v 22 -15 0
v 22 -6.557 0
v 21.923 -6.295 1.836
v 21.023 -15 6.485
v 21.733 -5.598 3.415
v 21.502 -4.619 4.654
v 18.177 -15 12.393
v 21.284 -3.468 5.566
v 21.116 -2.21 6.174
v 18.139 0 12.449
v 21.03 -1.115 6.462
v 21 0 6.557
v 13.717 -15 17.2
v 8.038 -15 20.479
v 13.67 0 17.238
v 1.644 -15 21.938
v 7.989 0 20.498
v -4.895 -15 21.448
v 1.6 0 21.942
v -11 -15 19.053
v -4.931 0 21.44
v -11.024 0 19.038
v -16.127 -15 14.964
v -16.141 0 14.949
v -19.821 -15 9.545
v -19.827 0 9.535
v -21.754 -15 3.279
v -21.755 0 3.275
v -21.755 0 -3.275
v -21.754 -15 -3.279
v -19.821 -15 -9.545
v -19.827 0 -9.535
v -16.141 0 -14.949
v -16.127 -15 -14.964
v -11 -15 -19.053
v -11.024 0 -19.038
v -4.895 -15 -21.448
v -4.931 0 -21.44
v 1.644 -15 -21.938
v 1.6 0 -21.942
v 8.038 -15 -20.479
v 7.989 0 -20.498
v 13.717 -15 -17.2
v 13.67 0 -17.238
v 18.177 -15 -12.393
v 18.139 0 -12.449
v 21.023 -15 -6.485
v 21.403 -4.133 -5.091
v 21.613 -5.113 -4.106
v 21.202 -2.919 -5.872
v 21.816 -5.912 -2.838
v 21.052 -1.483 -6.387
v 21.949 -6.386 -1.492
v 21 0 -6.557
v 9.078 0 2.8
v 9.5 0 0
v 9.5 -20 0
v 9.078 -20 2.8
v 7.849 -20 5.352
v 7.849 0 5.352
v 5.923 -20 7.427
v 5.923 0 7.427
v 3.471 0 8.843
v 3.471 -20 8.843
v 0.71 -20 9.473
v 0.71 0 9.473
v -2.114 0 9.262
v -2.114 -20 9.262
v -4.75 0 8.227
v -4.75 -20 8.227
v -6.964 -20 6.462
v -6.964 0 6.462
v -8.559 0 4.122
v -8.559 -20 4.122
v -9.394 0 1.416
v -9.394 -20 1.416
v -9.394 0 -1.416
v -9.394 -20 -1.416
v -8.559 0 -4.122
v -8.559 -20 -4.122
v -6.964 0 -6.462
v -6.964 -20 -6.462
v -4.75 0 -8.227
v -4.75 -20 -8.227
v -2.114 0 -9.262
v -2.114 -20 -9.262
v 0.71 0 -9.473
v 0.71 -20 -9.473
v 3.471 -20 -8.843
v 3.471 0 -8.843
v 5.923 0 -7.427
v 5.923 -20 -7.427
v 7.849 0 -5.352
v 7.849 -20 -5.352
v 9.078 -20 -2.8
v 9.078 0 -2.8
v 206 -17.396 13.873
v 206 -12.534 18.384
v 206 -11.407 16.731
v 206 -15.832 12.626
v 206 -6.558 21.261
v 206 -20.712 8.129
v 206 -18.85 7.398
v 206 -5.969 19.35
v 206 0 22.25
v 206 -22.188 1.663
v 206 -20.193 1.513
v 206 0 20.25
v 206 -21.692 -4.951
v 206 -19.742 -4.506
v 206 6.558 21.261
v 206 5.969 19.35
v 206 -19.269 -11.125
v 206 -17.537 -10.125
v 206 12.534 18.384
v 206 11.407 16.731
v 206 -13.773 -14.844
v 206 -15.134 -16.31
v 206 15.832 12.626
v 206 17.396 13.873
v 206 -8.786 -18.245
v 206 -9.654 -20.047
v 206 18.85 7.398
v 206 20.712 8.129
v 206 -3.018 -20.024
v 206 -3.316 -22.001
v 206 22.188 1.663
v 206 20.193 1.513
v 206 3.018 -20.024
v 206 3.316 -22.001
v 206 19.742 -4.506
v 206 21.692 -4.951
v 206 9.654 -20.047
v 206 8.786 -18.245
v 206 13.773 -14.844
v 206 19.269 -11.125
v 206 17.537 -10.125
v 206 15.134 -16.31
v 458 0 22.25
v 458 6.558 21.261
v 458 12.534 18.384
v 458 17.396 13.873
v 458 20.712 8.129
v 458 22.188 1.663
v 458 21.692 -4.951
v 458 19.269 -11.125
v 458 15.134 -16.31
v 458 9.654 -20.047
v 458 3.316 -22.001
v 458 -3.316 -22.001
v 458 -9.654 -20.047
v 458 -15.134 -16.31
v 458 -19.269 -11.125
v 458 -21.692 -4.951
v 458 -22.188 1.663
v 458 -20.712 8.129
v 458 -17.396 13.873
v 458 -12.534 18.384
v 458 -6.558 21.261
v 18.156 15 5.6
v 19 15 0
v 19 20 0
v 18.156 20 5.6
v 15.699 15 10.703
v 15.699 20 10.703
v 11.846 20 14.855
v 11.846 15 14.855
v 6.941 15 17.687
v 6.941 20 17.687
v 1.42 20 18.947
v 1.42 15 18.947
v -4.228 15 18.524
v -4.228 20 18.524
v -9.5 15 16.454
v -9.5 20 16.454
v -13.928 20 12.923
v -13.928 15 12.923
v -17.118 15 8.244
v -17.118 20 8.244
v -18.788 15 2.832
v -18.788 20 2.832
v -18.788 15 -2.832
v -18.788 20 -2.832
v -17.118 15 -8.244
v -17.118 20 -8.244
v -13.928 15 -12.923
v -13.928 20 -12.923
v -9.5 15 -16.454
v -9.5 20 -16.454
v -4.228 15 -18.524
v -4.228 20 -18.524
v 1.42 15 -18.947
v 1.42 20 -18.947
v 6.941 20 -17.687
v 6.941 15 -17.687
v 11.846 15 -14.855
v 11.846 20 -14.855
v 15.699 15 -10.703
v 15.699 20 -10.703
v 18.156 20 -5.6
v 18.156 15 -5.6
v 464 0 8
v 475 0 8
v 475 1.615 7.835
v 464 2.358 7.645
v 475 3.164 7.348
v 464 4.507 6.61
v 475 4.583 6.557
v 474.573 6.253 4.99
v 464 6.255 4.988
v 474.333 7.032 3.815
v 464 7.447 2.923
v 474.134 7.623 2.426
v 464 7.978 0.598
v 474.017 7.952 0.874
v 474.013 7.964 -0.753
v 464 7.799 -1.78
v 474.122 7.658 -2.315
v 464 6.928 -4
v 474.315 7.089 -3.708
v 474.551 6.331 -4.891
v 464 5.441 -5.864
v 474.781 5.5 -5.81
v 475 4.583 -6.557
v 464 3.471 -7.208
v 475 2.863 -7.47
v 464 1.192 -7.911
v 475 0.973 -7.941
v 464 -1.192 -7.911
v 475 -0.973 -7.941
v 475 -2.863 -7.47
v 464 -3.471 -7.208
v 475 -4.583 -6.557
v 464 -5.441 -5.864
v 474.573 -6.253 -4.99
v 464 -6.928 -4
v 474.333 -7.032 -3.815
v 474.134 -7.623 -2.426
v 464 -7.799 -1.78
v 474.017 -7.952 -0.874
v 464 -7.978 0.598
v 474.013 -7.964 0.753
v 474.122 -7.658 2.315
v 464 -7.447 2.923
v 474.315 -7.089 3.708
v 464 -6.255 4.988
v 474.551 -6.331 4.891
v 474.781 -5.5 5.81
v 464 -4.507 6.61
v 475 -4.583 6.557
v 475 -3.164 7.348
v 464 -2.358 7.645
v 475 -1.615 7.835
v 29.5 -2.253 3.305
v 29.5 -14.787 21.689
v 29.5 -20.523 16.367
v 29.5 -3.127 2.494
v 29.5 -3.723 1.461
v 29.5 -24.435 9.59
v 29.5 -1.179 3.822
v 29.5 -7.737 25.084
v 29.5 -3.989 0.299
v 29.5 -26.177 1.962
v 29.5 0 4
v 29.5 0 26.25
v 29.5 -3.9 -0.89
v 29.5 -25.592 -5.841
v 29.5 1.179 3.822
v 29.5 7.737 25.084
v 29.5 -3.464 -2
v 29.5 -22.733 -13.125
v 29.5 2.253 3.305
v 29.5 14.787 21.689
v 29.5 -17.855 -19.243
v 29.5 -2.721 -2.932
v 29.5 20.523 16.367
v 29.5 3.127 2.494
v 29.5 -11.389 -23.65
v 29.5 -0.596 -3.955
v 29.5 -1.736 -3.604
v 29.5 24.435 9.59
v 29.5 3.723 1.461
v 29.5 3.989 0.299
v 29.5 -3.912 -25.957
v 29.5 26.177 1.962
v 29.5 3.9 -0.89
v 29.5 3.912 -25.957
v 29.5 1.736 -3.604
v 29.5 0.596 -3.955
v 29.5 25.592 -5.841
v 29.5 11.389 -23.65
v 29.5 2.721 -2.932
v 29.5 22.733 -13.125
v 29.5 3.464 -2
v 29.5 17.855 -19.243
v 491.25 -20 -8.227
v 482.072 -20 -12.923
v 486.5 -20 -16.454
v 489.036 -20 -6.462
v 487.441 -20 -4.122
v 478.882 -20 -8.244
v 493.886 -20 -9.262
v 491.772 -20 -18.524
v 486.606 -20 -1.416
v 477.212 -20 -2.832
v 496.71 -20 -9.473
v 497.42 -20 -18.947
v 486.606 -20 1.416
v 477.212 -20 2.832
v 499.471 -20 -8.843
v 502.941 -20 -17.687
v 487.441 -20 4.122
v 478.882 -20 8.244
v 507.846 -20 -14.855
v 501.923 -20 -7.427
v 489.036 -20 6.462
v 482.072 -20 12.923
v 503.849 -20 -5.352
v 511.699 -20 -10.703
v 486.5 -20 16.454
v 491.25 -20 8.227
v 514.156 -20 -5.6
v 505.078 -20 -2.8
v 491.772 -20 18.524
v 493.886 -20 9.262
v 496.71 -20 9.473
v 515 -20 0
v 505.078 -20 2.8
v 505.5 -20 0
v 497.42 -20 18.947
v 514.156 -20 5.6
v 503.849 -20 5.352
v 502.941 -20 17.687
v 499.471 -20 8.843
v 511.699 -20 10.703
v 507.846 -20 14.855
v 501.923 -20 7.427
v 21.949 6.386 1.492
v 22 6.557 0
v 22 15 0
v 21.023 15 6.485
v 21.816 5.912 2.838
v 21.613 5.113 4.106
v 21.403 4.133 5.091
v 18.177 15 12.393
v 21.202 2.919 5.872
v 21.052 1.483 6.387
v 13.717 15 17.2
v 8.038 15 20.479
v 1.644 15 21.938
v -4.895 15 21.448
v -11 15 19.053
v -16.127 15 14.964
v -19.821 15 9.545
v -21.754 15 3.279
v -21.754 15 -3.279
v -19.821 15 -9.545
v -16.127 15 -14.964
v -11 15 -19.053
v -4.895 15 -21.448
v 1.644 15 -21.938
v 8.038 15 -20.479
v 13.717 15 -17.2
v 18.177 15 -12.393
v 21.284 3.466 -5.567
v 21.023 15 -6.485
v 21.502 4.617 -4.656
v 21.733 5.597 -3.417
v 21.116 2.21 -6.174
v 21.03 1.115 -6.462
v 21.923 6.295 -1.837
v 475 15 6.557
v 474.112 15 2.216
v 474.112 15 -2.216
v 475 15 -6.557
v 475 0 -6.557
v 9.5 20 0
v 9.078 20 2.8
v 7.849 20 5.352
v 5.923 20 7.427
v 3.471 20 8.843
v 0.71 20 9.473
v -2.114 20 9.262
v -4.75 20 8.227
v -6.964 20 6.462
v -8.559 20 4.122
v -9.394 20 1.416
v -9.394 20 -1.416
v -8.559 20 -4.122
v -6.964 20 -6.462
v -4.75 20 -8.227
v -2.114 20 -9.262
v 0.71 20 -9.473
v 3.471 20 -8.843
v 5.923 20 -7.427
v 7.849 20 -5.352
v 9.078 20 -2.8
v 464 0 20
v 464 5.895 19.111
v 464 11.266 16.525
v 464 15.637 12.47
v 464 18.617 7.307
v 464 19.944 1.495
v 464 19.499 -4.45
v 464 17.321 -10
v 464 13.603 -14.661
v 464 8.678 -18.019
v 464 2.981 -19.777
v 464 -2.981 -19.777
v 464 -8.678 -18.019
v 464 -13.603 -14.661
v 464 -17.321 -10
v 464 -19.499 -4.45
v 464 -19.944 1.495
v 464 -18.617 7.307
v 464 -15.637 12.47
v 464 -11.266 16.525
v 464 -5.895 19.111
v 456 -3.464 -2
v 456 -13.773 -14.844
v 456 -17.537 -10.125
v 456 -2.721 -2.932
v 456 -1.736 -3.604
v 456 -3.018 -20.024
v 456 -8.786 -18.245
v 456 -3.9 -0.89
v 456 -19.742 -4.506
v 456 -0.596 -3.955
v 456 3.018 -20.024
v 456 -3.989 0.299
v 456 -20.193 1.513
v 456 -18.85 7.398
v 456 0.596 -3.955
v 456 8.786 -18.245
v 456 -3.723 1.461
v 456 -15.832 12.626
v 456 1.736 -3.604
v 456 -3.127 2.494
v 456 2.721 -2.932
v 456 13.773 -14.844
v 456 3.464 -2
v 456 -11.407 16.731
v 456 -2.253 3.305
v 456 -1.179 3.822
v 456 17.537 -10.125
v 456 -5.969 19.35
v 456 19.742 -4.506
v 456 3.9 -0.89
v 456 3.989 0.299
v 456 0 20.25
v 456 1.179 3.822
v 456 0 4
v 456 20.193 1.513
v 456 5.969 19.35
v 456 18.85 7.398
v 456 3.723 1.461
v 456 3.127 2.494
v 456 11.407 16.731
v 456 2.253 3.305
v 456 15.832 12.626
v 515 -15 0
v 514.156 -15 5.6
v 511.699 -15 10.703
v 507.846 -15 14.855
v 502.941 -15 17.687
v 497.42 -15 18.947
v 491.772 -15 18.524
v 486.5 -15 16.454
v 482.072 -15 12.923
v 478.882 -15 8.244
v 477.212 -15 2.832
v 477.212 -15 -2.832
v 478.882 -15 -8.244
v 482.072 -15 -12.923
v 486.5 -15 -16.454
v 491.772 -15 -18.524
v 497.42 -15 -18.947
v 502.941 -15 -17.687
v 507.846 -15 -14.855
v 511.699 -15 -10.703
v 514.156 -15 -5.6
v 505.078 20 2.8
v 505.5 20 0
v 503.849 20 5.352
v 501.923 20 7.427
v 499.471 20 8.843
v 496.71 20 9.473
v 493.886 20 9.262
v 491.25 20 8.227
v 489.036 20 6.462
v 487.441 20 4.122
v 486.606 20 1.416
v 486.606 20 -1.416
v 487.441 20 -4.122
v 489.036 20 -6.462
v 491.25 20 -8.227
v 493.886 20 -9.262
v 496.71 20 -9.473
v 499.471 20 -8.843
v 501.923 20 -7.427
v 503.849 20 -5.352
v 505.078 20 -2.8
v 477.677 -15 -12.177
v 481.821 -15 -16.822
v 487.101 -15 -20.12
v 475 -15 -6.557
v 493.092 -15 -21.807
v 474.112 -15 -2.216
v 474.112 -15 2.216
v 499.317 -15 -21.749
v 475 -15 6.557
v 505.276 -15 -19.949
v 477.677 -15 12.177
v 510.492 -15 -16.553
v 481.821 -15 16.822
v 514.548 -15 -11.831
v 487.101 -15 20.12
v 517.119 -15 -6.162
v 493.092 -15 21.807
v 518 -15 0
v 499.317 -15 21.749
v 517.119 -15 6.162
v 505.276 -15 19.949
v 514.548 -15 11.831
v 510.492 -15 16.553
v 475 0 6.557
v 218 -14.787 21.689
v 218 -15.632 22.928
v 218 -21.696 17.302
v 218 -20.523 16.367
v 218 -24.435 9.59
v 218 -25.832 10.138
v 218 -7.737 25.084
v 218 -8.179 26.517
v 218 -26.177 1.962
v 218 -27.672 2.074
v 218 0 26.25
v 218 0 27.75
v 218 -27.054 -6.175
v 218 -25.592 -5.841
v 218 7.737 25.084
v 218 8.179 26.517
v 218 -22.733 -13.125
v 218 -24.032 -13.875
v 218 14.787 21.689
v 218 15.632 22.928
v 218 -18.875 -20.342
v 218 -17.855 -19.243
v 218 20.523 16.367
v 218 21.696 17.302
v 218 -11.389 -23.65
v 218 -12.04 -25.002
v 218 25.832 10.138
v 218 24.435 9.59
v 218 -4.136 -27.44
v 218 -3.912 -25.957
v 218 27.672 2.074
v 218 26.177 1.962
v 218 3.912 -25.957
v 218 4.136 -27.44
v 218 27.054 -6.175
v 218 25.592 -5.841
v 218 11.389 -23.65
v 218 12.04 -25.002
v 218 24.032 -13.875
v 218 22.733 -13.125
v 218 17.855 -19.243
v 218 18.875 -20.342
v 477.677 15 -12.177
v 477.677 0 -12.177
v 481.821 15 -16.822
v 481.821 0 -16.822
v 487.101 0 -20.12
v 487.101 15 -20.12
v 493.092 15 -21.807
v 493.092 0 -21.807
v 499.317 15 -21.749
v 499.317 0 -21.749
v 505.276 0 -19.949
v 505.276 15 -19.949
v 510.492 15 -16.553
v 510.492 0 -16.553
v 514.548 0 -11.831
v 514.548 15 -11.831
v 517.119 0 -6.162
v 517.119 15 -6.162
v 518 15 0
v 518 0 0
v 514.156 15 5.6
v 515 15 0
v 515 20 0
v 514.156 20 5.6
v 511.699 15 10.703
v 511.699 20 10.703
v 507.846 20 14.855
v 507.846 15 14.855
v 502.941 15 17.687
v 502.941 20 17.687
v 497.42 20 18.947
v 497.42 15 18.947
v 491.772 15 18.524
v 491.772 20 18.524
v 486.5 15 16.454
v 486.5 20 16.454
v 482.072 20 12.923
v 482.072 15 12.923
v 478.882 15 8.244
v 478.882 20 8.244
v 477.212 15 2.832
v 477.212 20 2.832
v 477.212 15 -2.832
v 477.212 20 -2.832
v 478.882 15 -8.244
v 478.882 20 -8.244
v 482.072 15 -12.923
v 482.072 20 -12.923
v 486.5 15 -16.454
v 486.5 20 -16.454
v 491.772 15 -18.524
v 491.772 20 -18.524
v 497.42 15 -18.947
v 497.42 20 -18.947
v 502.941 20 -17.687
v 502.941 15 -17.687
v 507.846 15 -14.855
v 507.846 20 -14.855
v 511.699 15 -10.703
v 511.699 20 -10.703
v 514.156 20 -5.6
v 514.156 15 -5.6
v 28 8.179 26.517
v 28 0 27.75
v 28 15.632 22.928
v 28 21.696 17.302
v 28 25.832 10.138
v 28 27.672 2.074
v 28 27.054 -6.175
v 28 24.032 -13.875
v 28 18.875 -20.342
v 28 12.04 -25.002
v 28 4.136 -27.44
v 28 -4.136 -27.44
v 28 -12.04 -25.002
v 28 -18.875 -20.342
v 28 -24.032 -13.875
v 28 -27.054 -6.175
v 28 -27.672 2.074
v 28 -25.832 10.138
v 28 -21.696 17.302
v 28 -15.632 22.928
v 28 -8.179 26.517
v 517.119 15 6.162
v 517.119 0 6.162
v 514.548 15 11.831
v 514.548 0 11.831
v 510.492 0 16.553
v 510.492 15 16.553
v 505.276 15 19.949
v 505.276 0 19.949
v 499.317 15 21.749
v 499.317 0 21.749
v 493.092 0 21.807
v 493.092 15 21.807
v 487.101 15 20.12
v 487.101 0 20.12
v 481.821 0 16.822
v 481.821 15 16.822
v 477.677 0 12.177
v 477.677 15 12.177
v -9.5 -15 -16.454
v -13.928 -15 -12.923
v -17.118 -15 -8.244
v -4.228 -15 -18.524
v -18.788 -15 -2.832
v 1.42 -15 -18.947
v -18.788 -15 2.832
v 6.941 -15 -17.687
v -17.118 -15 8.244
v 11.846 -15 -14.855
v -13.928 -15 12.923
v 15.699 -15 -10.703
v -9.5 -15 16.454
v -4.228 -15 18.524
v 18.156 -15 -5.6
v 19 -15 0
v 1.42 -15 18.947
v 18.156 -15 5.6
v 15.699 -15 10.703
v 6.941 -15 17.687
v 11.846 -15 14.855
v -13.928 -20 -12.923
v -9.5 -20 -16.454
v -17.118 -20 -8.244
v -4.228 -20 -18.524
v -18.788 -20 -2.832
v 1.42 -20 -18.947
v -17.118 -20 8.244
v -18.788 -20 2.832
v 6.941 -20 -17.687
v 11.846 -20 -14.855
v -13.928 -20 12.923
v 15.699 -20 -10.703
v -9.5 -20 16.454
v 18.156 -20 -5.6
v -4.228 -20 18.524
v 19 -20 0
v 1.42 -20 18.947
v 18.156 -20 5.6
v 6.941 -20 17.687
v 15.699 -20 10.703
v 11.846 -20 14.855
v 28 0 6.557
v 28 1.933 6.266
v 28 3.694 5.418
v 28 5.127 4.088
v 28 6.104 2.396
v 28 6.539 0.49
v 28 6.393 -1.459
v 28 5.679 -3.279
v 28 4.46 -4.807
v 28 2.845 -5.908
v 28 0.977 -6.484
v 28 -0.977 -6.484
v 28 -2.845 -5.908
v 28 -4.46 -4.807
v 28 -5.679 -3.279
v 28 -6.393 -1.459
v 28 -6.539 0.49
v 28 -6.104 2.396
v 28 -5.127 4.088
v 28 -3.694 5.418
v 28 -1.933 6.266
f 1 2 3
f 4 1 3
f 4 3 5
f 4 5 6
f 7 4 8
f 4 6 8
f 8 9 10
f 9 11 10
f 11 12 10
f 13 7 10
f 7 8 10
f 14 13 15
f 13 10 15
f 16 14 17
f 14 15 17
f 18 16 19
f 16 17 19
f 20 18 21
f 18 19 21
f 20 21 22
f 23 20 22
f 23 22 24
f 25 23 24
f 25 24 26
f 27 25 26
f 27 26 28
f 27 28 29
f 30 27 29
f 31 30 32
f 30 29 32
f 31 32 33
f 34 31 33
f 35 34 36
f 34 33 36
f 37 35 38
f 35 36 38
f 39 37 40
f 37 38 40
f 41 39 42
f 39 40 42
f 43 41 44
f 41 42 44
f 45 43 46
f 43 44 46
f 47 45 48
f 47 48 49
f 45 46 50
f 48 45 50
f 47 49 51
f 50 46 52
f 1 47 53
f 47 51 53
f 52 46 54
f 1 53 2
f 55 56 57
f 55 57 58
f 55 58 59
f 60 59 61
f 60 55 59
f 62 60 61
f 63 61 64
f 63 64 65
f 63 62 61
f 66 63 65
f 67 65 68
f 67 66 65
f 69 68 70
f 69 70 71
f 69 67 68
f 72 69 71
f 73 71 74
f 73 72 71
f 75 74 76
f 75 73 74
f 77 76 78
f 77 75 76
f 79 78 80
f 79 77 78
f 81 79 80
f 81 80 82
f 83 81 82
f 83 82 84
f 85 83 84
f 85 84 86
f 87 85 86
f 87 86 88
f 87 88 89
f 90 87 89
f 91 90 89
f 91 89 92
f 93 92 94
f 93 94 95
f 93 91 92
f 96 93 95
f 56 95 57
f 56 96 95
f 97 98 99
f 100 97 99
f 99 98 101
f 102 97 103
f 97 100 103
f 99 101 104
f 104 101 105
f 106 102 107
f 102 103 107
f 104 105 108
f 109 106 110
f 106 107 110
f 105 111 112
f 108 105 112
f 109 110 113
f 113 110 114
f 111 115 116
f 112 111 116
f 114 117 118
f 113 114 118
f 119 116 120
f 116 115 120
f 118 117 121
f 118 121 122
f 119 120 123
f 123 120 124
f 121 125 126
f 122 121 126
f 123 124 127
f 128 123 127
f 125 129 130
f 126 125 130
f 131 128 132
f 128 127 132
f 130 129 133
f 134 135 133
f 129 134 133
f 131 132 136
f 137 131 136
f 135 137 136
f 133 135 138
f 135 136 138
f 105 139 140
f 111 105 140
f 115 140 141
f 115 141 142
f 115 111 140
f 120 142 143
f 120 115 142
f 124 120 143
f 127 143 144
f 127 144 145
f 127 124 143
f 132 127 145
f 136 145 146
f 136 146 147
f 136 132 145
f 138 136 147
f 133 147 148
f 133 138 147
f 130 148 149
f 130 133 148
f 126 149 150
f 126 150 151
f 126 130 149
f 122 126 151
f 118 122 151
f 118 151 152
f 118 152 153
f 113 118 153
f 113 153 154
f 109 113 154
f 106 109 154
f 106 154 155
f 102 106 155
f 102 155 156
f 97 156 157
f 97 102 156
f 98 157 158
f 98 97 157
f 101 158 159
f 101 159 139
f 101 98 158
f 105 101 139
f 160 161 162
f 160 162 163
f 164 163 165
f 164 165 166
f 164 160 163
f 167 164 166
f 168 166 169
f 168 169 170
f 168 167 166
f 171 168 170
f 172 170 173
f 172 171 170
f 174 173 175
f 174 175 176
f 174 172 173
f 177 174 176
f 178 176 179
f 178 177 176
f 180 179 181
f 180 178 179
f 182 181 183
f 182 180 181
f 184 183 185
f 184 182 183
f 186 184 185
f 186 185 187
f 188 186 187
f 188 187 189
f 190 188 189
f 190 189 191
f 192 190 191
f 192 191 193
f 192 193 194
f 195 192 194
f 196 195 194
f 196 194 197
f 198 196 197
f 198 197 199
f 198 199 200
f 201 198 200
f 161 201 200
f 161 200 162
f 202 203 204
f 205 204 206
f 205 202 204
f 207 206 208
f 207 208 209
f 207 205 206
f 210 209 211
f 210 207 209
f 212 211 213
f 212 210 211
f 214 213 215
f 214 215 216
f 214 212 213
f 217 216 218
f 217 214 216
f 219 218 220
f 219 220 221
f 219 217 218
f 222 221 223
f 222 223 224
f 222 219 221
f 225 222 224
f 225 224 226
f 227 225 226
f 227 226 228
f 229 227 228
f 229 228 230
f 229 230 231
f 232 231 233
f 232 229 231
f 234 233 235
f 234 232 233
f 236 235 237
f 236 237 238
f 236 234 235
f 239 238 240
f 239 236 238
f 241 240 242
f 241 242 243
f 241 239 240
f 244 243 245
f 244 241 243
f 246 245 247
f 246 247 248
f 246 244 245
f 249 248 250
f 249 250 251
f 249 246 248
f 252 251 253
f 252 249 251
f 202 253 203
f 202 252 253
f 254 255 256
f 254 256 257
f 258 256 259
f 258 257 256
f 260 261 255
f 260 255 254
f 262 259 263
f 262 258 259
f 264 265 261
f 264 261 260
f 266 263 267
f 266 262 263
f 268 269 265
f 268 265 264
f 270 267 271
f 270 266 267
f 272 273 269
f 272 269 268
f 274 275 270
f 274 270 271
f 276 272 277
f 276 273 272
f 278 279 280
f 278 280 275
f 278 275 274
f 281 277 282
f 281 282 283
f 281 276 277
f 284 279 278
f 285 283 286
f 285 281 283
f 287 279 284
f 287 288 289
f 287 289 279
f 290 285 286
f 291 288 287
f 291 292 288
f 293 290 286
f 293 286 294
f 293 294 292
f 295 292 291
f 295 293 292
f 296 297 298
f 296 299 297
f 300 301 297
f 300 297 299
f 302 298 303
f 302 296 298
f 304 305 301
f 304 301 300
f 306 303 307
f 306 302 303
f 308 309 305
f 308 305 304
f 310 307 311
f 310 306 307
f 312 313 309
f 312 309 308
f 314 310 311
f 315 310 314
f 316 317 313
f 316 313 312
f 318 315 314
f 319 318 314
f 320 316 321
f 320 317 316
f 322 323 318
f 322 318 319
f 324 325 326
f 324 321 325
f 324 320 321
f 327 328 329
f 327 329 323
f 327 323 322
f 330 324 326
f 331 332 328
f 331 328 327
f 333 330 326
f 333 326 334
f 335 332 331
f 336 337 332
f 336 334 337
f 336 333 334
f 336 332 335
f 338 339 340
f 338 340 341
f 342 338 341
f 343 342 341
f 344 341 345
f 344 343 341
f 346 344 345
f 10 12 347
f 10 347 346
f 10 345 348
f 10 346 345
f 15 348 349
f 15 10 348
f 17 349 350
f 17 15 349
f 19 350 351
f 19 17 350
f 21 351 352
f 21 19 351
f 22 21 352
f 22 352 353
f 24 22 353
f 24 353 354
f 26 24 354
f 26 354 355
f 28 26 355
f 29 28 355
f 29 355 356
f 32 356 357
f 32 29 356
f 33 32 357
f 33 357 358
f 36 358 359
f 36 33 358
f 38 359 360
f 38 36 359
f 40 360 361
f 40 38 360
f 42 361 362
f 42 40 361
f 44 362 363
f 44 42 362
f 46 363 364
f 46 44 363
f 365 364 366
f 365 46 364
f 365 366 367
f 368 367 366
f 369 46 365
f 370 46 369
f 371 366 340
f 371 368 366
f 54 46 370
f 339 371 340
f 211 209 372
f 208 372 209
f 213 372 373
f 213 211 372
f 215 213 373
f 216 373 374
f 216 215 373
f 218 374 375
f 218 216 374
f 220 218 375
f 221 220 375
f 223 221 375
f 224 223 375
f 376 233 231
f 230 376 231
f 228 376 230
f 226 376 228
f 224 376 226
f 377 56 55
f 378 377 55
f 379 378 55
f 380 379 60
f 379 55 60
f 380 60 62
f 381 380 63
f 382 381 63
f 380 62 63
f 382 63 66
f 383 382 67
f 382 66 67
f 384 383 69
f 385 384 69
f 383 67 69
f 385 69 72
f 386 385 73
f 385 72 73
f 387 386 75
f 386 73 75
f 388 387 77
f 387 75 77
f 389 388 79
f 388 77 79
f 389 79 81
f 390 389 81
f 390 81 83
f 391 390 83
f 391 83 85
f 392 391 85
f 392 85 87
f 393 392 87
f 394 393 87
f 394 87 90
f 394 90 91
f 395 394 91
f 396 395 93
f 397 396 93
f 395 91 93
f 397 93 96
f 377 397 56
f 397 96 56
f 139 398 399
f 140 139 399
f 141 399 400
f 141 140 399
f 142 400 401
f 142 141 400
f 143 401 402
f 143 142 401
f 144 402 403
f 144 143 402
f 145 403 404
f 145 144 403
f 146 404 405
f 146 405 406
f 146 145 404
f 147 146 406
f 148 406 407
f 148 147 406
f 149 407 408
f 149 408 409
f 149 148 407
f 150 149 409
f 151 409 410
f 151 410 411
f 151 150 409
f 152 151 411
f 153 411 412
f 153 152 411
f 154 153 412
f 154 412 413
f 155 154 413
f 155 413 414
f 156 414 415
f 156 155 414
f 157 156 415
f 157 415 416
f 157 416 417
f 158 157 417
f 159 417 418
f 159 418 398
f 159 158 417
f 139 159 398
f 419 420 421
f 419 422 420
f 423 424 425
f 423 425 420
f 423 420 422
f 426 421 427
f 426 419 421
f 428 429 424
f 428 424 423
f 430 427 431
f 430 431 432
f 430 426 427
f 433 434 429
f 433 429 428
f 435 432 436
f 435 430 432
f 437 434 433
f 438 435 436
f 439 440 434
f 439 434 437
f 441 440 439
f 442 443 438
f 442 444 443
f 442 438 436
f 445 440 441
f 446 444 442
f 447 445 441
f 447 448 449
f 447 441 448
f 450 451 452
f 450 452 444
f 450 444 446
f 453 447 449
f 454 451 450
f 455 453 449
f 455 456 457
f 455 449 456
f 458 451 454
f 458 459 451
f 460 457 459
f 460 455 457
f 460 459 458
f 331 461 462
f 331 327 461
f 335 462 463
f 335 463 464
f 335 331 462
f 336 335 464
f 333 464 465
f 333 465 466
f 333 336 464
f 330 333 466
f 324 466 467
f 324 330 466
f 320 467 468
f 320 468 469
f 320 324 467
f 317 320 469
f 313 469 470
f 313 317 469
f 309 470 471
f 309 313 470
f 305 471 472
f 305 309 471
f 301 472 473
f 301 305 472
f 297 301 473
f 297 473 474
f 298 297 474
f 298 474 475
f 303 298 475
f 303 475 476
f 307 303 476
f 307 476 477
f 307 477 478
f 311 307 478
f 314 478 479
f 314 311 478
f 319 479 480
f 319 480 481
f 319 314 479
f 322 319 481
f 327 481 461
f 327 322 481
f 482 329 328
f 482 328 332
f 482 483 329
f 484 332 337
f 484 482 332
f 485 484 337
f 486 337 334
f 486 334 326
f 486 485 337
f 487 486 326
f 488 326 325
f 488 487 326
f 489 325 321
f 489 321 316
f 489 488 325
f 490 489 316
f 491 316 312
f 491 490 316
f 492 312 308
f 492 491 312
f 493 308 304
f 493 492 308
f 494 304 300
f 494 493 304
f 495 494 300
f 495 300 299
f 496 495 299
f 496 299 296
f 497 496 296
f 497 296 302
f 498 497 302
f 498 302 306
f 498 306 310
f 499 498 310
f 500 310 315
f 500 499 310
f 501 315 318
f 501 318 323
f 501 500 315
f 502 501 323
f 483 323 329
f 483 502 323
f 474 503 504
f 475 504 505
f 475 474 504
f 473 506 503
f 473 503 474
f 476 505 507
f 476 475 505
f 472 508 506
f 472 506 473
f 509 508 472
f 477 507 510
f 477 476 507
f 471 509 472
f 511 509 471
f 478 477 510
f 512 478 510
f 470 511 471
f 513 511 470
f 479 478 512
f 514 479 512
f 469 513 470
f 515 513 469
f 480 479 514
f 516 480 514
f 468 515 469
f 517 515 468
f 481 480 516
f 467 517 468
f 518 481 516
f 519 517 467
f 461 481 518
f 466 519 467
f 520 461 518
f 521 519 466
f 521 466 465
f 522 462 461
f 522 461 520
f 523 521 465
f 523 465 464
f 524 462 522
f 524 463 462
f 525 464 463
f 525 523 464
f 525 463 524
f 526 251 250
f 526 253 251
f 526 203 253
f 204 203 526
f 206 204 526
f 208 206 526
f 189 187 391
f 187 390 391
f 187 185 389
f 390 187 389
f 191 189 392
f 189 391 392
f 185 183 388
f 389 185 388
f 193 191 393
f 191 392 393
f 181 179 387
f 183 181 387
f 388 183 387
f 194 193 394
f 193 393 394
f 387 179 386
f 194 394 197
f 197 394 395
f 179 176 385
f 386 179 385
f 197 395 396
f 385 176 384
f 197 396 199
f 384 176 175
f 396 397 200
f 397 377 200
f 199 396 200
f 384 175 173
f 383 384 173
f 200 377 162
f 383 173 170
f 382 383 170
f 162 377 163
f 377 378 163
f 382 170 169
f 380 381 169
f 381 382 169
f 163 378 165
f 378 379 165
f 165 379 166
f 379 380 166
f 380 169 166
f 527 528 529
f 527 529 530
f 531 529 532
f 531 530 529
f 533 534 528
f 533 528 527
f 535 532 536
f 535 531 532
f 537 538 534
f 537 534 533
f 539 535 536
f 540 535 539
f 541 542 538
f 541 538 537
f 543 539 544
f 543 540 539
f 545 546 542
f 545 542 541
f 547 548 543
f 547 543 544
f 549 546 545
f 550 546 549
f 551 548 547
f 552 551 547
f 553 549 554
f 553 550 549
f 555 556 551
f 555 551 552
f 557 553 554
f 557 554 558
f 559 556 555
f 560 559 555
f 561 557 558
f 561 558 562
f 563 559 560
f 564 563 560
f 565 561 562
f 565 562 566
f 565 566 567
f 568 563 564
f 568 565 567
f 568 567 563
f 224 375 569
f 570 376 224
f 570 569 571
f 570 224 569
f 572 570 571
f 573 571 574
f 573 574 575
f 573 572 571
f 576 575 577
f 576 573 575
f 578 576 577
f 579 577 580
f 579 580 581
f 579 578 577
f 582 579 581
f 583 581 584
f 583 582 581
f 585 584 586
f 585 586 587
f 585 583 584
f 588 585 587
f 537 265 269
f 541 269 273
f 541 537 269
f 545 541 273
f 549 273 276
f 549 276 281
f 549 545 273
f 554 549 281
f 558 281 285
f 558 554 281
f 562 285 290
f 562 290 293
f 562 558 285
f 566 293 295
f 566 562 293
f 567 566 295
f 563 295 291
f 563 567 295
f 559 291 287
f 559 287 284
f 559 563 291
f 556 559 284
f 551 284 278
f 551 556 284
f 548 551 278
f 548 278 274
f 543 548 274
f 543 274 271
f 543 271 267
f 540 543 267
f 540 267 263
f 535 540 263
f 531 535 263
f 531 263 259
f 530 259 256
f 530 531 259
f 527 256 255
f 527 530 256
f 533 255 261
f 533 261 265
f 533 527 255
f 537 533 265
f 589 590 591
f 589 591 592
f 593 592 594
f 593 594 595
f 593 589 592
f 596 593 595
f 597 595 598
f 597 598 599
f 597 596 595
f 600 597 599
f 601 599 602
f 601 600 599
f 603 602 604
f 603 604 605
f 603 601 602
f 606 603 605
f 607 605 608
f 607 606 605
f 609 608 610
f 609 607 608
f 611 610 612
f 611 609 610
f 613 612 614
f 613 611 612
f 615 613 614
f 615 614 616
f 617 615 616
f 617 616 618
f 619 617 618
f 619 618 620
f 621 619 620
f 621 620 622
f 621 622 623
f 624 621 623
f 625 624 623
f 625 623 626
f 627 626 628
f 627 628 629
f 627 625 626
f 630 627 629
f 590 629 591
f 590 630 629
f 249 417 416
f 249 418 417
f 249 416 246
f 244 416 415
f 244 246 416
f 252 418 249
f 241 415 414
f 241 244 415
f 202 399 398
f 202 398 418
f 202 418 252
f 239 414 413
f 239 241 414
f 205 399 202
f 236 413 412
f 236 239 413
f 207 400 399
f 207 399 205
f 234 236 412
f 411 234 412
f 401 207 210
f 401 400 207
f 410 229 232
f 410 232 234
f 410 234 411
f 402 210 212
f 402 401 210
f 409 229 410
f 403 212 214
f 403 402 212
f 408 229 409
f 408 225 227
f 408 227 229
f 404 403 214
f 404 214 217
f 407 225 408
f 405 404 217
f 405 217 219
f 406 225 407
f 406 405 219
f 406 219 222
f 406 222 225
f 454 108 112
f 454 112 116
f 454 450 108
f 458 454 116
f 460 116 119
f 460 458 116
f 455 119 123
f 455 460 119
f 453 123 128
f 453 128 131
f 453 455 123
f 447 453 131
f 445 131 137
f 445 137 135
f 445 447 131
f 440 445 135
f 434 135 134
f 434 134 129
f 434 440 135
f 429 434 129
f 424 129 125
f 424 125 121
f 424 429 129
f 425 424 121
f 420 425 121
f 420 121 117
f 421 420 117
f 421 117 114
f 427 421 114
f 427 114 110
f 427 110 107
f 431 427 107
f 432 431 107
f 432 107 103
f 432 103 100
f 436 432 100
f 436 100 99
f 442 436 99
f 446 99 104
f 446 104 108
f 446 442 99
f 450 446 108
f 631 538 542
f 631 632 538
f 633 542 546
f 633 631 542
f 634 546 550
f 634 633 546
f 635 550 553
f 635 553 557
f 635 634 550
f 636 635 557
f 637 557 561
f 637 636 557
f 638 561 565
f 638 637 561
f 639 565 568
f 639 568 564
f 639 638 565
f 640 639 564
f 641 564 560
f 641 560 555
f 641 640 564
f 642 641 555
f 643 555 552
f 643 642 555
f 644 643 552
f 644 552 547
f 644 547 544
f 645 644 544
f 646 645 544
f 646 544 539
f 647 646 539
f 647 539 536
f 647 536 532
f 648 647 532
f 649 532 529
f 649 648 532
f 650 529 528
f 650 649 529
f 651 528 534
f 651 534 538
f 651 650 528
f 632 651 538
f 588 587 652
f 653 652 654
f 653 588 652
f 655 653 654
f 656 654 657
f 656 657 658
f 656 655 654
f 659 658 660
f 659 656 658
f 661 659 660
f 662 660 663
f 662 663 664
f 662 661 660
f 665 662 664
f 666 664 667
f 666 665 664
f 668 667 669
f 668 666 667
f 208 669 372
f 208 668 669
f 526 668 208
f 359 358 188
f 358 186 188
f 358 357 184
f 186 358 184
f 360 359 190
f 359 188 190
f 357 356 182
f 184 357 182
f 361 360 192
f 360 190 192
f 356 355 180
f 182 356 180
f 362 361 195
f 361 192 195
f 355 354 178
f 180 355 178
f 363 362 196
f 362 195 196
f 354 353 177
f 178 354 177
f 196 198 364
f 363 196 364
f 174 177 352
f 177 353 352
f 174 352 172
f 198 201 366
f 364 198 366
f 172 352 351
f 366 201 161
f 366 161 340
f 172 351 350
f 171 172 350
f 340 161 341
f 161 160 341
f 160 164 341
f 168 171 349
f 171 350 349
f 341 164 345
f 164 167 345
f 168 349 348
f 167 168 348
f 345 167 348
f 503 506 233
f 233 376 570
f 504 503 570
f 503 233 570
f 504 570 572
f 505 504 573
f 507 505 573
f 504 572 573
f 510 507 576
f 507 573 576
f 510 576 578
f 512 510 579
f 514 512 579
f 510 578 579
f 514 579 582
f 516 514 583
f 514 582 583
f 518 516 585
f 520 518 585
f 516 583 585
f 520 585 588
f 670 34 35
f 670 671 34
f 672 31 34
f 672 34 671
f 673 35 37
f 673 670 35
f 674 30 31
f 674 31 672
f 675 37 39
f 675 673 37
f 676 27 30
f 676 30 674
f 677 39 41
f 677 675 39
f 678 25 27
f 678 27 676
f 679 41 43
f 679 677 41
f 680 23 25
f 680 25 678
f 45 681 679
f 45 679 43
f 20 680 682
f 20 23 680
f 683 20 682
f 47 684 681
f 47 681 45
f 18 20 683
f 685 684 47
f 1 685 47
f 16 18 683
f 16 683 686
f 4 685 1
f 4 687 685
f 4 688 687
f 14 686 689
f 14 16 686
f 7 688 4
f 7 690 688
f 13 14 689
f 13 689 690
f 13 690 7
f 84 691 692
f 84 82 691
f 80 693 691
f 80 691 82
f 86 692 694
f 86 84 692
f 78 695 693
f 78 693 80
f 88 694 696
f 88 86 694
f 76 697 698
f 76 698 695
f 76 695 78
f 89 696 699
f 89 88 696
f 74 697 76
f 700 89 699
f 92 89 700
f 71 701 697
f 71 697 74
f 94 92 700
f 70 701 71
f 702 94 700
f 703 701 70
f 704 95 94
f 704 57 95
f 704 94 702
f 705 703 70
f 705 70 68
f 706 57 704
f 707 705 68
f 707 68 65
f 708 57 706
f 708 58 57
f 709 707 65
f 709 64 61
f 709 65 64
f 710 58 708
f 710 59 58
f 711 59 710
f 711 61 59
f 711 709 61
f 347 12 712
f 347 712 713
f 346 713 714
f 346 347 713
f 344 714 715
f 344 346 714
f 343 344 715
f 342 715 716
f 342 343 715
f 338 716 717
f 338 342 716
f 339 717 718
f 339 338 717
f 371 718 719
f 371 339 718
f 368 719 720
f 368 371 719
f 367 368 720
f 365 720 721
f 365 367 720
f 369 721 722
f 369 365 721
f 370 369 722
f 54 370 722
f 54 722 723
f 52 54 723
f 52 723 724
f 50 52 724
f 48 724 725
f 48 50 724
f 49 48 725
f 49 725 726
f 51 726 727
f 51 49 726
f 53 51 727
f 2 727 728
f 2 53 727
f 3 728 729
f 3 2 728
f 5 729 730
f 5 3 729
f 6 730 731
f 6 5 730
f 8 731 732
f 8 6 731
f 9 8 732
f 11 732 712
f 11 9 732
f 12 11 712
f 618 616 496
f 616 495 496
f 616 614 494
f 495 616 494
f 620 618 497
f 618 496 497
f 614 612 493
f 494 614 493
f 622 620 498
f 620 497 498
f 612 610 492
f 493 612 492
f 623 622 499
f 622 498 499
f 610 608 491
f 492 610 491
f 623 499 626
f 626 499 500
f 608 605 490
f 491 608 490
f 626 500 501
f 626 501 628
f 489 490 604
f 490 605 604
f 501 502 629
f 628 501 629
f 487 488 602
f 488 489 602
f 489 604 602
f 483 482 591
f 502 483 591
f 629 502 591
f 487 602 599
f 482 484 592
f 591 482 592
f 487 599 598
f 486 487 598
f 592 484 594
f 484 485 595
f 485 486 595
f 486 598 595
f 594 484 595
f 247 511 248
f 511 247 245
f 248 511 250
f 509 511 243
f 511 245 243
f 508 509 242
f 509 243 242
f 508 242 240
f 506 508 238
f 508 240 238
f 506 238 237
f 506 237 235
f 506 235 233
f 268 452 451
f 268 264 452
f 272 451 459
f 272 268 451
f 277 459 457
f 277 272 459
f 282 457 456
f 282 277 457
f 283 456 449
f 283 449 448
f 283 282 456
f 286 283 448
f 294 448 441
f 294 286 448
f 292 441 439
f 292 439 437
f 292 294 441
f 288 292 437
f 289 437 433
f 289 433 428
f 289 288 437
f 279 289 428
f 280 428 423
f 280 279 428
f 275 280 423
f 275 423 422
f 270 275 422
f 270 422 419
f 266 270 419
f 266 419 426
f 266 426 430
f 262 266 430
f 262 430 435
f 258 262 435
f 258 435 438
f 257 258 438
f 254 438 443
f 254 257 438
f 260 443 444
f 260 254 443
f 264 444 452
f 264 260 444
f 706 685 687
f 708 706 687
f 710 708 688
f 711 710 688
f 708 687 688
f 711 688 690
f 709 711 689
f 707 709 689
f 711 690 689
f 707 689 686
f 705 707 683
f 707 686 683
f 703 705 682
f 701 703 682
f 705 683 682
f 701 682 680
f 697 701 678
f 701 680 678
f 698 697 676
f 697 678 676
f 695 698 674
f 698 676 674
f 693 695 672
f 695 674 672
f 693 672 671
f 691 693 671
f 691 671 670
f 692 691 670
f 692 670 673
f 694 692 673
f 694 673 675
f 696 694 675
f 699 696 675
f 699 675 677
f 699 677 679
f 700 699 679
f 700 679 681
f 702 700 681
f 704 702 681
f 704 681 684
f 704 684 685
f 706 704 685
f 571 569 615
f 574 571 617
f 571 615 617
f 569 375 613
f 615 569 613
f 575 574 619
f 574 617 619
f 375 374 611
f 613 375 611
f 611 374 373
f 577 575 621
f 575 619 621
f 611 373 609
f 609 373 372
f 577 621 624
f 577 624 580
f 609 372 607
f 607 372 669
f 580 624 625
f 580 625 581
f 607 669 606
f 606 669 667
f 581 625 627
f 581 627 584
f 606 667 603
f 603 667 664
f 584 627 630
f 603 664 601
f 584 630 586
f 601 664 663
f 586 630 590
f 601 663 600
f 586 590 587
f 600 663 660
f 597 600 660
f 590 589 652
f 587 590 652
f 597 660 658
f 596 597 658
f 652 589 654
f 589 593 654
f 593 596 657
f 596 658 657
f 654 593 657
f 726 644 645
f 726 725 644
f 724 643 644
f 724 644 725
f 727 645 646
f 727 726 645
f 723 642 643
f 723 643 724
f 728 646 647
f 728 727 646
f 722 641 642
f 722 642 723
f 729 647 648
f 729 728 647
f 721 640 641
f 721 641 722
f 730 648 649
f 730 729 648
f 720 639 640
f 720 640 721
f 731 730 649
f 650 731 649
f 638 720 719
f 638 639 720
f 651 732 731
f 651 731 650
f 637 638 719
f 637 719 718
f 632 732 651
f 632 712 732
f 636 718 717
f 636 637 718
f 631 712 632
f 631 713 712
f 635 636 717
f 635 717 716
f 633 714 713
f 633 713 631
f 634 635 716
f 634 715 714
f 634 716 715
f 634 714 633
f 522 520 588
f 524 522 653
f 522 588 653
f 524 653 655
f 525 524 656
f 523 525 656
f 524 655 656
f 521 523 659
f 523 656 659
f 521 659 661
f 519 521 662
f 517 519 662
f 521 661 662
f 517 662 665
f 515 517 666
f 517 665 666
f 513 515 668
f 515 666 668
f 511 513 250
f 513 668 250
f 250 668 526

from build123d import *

# Parameters (mm, degrees)
F0_W     = 188.5
F0_H     = 4
F0_W_2   = 12
F0_H_2   = 2
F0_W_3   = 238
F2_R     = 22
F2_R_2   = 19
F3_DEPTH = 15
F4_R     = 19
F4_R_2   = 9.5
F5_DEPTH = 20


with BuildPart() as f1:
    # F0 (on Front) → F1 (revolve)
    with BuildSketch(Plane.XZ):
        Polygon((28, 6.5574385243), (28, 0), (29.5, 0), (29.5, 4), (29.5, 26.25), (218, 26.25), (218, 27.75), (28, 27.75), align=None)
        with BuildLine():
            ThreePointArc((21, 6.5574385243), (21.7485631709, 3.3166247904), (22, 0))
            Line((22, 0), (28, 0))
            Line((28, 0), (28, 6.5574385243))
            Line((28, 6.5574385243), (21, 6.5574385243))
        make_face()
        with Locations((123.75, 2)):
            Rectangle(F0_W, F0_H)
        Polygon((456, 4), (456, 0), (458, 0), (458, 22.25), (218, 22.25), (218, 20.25), (456, 20.25), align=None)
        with Locations((212, 21.25)):
            Rectangle(F0_W_2, F0_H_2)
        with Locations((337, 2)):
            Rectangle(F0_W_3, F0_H)
        Polygon((458, 22.25), (458, 0), (464, 0), (464, 8), (464, 20), align=None)
        with BuildLine():
            Line((464, 8), (464, 0))
            Line((464, 0), (474, 0))
            ThreePointArc((474, 0), (474.2514368291, 3.3166247904), (475, 6.5574385243))
            Line((475, 6.5574385243), (475, 8))
            Line((475, 8), (464, 8))
        make_face()
        with BuildLine():
            ThreePointArc((475, 6.5574385243), (474.2514368291, 3.3166247904), (474, 0))
            Line((474, 0), (475, 0))
            Line((475, 0), (475, 6.5574385243))
        make_face()
    revolve(axis=Axis((242.75, 0, 0), (-1, 0, 0)))

    # F2 (on Front) → F3 (join, symmetric)
    with BuildSketch(Plane.XZ):
        Circle(F2_R)
        Circle(F2_R_2, mode=Mode.SUBTRACT)
        with BuildLine():
            ThreePointArc((518, 0), (499.3166247904, 21.7485631709), (475, 6.5574385243))
            Line((475, 6.5574385243), (475, -6.5574385243))
            ThreePointArc((475, -6.5574385243), (499.3166247904, -21.7485631709), (518, 0))
        make_face()
        with Locations((496, 0)):
            Circle(F2_R_2, mode=Mode.SUBTRACT)
        with BuildLine():
            Line((475, -6.5574385243), (475, 6.5574385243))
            ThreePointArc((475, 6.5574385243), (474, 0), (475, -6.5574385243))
        make_face()
    extrude(amount=F3_DEPTH, both=True)

    # F4 (on Front) → F5 (join, symmetric)
    with BuildSketch(Plane.XZ):
        Circle(F4_R)
        Circle(F4_R_2, mode=Mode.SUBTRACT)
        with Locations((496, 0)):
            Circle(F4_R)
        with Locations((496, 0)):
            Circle(F4_R_2, mode=Mode.SUBTRACT)
    extrude(amount=F5_DEPTH, both=True)


solid = f1.part
